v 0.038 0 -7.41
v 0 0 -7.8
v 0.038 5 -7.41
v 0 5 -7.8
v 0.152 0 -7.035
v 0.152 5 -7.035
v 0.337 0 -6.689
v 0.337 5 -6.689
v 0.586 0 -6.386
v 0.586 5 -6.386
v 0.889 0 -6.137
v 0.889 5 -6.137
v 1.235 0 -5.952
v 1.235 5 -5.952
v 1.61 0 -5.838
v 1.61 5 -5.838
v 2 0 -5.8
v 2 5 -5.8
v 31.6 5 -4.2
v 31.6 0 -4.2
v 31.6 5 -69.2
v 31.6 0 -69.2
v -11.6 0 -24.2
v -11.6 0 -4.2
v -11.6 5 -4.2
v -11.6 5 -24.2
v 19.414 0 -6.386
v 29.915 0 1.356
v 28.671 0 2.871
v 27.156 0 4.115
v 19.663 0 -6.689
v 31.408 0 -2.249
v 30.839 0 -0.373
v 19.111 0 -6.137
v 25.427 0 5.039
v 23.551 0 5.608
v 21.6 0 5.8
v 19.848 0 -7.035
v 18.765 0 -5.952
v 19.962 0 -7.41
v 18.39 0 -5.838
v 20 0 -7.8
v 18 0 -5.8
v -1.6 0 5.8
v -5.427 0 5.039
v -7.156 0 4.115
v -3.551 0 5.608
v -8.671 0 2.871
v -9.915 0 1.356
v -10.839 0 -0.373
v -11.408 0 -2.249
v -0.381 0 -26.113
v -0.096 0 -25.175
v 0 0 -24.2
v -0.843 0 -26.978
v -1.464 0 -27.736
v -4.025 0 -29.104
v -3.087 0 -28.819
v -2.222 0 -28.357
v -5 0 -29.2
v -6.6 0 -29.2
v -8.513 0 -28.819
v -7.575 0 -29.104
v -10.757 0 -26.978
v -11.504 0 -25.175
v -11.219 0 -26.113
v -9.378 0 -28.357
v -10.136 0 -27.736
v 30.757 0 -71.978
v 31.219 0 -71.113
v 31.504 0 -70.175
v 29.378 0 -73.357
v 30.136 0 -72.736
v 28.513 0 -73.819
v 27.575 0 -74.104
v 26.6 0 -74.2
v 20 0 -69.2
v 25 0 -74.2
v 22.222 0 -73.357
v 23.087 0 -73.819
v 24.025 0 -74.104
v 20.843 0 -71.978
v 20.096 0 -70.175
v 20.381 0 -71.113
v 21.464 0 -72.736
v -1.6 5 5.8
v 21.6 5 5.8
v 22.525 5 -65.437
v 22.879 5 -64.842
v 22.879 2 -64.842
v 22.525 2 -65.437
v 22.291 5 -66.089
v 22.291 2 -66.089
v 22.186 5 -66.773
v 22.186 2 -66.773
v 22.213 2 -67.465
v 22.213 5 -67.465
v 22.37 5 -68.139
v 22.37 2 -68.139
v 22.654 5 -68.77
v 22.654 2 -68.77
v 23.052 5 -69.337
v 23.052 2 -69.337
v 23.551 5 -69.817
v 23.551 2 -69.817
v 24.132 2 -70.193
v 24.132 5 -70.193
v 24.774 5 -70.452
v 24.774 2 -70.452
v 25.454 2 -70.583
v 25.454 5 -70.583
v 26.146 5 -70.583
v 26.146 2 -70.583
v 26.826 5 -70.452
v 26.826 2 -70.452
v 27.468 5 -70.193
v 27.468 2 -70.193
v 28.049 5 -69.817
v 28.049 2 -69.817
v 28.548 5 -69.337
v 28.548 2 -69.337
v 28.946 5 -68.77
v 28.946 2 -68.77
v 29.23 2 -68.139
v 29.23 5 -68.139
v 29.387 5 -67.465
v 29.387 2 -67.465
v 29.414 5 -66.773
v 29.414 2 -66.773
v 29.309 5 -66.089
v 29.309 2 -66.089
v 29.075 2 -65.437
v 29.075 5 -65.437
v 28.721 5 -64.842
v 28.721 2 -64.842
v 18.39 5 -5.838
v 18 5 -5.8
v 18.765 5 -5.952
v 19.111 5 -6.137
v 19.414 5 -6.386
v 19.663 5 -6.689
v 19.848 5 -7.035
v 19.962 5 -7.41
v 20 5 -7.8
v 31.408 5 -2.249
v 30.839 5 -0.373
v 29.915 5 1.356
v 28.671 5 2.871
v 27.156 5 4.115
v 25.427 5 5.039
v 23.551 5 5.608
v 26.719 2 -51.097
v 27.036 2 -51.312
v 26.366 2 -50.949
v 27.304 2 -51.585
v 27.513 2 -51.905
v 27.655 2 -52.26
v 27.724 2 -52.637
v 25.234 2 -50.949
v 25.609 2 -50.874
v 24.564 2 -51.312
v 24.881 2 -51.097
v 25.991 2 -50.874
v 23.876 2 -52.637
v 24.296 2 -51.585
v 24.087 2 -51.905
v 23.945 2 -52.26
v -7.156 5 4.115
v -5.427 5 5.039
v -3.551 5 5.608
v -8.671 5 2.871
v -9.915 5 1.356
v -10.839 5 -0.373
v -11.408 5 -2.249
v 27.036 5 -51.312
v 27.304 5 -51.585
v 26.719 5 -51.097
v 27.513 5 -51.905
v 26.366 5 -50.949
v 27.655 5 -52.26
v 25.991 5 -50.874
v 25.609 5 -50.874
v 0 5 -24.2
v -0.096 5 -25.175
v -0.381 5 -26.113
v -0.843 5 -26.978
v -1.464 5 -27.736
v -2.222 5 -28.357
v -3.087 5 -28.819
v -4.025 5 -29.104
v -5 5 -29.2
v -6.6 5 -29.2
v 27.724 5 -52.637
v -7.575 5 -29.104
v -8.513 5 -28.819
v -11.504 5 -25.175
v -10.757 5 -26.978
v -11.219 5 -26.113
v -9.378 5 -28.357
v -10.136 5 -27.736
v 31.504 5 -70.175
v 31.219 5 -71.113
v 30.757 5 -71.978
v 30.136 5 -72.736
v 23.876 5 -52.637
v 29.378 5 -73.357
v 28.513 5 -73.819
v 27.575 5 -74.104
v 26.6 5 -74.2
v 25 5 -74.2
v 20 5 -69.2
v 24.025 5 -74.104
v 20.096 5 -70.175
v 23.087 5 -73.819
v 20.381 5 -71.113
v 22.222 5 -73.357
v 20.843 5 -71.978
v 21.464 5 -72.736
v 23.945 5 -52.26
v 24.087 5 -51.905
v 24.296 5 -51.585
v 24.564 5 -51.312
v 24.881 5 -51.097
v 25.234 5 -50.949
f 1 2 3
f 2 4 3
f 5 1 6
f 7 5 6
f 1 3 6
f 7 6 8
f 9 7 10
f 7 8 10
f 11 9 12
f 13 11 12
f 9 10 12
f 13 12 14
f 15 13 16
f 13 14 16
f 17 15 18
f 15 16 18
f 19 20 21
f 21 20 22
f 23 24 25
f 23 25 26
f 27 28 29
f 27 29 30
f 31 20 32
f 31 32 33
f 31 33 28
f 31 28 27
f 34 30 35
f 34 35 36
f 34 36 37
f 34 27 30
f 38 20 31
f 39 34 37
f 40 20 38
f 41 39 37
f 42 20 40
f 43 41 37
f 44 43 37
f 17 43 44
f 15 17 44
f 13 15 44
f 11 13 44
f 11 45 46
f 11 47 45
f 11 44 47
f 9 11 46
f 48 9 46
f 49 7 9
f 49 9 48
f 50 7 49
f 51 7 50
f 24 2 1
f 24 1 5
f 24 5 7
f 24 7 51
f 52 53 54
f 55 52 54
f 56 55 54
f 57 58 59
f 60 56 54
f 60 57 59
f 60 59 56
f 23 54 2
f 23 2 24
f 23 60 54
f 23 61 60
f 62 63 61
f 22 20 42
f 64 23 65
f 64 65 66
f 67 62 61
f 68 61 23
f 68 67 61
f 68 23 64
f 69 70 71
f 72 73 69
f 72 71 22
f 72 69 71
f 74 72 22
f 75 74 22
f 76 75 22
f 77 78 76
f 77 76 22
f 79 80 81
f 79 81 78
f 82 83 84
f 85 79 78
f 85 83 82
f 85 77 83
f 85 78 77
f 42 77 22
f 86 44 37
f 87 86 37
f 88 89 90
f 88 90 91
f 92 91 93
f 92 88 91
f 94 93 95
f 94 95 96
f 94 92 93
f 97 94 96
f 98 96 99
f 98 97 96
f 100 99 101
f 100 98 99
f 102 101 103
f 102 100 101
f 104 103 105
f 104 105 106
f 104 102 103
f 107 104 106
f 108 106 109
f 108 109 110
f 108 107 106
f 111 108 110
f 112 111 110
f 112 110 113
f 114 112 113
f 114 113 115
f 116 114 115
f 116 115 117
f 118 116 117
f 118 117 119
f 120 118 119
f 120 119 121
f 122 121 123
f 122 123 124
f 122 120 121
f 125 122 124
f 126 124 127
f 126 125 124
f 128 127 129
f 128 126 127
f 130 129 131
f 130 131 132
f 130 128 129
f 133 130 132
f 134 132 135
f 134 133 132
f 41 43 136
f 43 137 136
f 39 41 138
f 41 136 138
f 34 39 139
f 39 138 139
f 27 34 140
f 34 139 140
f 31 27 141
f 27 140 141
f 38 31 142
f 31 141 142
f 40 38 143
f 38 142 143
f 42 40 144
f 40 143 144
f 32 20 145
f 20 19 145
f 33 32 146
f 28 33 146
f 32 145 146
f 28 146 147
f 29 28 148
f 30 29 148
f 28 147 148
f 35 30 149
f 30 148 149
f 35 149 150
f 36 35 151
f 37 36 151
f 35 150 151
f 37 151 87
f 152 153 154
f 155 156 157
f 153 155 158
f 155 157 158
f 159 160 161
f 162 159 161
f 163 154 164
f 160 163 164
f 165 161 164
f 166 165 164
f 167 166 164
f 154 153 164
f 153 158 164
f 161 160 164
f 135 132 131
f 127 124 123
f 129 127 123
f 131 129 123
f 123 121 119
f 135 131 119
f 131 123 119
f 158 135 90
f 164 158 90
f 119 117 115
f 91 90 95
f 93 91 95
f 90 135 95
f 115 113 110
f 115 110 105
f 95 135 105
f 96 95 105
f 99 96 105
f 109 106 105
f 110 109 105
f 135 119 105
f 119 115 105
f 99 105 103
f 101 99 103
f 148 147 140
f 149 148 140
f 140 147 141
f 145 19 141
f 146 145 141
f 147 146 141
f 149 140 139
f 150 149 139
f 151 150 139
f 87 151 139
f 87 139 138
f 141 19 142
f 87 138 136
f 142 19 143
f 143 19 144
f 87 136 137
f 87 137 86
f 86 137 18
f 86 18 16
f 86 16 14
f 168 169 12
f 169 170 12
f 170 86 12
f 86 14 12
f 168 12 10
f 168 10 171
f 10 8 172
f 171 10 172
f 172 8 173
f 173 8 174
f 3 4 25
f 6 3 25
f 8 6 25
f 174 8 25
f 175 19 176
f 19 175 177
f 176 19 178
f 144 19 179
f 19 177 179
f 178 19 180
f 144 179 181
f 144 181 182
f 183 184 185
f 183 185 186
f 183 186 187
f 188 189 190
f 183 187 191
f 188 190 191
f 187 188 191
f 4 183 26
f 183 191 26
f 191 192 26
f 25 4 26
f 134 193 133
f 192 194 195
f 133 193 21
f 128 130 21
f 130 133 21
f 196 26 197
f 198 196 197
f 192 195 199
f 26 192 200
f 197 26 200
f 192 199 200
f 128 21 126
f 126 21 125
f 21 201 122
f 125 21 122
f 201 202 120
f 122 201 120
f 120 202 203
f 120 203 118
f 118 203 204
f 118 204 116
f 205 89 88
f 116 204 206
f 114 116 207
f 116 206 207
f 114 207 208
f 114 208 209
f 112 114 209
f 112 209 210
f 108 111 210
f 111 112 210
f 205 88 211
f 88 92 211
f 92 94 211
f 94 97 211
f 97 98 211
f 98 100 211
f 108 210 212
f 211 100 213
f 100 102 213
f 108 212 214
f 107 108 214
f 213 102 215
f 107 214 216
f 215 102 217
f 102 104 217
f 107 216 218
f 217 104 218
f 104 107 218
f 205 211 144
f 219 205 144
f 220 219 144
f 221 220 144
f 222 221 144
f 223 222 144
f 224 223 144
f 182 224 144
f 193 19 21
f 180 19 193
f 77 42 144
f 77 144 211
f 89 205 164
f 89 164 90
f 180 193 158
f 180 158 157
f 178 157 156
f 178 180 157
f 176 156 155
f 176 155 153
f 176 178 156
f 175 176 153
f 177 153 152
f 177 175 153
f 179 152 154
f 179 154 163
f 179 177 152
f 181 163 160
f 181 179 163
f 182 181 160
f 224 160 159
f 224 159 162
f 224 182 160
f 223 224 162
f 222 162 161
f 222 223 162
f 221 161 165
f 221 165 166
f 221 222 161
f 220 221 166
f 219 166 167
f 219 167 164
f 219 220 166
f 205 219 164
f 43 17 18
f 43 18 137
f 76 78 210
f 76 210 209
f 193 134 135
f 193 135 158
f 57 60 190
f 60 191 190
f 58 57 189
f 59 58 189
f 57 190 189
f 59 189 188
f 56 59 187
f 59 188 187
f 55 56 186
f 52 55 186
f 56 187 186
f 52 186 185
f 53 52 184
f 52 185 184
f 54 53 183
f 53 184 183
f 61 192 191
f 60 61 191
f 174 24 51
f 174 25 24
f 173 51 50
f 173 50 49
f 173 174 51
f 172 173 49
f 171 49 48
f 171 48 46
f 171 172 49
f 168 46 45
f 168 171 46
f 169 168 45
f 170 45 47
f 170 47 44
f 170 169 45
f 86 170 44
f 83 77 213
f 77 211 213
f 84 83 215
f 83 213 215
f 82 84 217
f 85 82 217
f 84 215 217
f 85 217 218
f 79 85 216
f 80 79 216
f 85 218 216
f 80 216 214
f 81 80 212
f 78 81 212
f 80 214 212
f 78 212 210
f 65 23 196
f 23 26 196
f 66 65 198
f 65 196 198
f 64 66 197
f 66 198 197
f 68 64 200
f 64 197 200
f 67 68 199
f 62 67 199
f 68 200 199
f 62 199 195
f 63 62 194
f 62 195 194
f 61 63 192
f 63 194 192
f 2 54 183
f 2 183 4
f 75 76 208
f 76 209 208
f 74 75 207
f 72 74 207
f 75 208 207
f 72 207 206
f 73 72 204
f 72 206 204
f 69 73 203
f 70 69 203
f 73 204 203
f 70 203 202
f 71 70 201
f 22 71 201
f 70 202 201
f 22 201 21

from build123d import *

# Parameters (mm, degrees)
BOSS_EXTRUDE1_DEPTH = 5
CUT_EXTRUDE3_DEPTH  = 3
FILLET1_R           = 5
FILLET2_R           = 10
FILLET3_R           = 5
FILLET4_R           = 2


with BuildPart() as part:
    # Sketch1 → Boss-Extrude1 (new body)
    with BuildSketch(Plane(origin=(0, 0, 0), x_dir=(1, 0, 0), z_dir=(0, 1, 0))):
        Polygon((0, 5.8), (20, 5.8), (20, 74.2), (31.6, 74.2), (31.6, 5.8), (31.6, -5.8), (20, -5.8), (0, -5.8), (-11.6, -5.8), (-11.6, 29.2), (0, 29.2), align=None)
    extrude(amount=BOSS_EXTRUDE1_DEPTH)

    # Sketch2 → Cut-Extrude3 (cut)
    with BuildSketch(Plane(origin=(0, 5, 0), x_dir=(1, 0, 0), z_dir=(0, 1, 0))):
        with BuildLine():
            Line((28.721, 64.841739258), (27.723587356, 52.636800493))
            ThreePointArc((27.723587356, 52.636800493), (25.8, 50.864), (23.876412644, 52.636800493))
            Line((23.876412644, 52.636800493), (22.879, 64.841739258))
            ThreePointArc((22.879, 64.841739258), (25.8, 70.6), (28.721, 64.841739258))
        make_face()
    extrude(amount=-CUT_EXTRUDE3_DEPTH, mode=Mode.SUBTRACT)

    # Fillet1
    fillet1_edges = [part.edges().sort_by_distance(p)[0] for p in [
        (20, 2.5, -74.2),
        (31.6, 2.5, -74.2),
    ]]
    fillet(fillet1_edges, radius=FILLET1_R)

    # Fillet2
    fillet2_edges = [part.edges().sort_by_distance(p)[0] for p in [
        (31.6, 2.5, 5.8),
        (-11.6, 2.5, 5.8),
    ]]
    fillet(fillet2_edges, radius=FILLET2_R)

    # Fillet3
    fillet3_edges = [part.edges().sort_by_distance(p)[0] for p in [
        (-11.6, 2.5, -29.2),
        (0, 2.5, -29.2),
    ]]
    fillet(fillet3_edges, radius=FILLET3_R)

    # Fillet4
    fillet4_edges = [part.edges().sort_by_distance(p)[0] for p in [
        (0, 2.5, -5.8),
        (20, 2.5, -5.8),
    ]]
    fillet(fillet4_edges, radius=FILLET4_R)


solid = part.part
